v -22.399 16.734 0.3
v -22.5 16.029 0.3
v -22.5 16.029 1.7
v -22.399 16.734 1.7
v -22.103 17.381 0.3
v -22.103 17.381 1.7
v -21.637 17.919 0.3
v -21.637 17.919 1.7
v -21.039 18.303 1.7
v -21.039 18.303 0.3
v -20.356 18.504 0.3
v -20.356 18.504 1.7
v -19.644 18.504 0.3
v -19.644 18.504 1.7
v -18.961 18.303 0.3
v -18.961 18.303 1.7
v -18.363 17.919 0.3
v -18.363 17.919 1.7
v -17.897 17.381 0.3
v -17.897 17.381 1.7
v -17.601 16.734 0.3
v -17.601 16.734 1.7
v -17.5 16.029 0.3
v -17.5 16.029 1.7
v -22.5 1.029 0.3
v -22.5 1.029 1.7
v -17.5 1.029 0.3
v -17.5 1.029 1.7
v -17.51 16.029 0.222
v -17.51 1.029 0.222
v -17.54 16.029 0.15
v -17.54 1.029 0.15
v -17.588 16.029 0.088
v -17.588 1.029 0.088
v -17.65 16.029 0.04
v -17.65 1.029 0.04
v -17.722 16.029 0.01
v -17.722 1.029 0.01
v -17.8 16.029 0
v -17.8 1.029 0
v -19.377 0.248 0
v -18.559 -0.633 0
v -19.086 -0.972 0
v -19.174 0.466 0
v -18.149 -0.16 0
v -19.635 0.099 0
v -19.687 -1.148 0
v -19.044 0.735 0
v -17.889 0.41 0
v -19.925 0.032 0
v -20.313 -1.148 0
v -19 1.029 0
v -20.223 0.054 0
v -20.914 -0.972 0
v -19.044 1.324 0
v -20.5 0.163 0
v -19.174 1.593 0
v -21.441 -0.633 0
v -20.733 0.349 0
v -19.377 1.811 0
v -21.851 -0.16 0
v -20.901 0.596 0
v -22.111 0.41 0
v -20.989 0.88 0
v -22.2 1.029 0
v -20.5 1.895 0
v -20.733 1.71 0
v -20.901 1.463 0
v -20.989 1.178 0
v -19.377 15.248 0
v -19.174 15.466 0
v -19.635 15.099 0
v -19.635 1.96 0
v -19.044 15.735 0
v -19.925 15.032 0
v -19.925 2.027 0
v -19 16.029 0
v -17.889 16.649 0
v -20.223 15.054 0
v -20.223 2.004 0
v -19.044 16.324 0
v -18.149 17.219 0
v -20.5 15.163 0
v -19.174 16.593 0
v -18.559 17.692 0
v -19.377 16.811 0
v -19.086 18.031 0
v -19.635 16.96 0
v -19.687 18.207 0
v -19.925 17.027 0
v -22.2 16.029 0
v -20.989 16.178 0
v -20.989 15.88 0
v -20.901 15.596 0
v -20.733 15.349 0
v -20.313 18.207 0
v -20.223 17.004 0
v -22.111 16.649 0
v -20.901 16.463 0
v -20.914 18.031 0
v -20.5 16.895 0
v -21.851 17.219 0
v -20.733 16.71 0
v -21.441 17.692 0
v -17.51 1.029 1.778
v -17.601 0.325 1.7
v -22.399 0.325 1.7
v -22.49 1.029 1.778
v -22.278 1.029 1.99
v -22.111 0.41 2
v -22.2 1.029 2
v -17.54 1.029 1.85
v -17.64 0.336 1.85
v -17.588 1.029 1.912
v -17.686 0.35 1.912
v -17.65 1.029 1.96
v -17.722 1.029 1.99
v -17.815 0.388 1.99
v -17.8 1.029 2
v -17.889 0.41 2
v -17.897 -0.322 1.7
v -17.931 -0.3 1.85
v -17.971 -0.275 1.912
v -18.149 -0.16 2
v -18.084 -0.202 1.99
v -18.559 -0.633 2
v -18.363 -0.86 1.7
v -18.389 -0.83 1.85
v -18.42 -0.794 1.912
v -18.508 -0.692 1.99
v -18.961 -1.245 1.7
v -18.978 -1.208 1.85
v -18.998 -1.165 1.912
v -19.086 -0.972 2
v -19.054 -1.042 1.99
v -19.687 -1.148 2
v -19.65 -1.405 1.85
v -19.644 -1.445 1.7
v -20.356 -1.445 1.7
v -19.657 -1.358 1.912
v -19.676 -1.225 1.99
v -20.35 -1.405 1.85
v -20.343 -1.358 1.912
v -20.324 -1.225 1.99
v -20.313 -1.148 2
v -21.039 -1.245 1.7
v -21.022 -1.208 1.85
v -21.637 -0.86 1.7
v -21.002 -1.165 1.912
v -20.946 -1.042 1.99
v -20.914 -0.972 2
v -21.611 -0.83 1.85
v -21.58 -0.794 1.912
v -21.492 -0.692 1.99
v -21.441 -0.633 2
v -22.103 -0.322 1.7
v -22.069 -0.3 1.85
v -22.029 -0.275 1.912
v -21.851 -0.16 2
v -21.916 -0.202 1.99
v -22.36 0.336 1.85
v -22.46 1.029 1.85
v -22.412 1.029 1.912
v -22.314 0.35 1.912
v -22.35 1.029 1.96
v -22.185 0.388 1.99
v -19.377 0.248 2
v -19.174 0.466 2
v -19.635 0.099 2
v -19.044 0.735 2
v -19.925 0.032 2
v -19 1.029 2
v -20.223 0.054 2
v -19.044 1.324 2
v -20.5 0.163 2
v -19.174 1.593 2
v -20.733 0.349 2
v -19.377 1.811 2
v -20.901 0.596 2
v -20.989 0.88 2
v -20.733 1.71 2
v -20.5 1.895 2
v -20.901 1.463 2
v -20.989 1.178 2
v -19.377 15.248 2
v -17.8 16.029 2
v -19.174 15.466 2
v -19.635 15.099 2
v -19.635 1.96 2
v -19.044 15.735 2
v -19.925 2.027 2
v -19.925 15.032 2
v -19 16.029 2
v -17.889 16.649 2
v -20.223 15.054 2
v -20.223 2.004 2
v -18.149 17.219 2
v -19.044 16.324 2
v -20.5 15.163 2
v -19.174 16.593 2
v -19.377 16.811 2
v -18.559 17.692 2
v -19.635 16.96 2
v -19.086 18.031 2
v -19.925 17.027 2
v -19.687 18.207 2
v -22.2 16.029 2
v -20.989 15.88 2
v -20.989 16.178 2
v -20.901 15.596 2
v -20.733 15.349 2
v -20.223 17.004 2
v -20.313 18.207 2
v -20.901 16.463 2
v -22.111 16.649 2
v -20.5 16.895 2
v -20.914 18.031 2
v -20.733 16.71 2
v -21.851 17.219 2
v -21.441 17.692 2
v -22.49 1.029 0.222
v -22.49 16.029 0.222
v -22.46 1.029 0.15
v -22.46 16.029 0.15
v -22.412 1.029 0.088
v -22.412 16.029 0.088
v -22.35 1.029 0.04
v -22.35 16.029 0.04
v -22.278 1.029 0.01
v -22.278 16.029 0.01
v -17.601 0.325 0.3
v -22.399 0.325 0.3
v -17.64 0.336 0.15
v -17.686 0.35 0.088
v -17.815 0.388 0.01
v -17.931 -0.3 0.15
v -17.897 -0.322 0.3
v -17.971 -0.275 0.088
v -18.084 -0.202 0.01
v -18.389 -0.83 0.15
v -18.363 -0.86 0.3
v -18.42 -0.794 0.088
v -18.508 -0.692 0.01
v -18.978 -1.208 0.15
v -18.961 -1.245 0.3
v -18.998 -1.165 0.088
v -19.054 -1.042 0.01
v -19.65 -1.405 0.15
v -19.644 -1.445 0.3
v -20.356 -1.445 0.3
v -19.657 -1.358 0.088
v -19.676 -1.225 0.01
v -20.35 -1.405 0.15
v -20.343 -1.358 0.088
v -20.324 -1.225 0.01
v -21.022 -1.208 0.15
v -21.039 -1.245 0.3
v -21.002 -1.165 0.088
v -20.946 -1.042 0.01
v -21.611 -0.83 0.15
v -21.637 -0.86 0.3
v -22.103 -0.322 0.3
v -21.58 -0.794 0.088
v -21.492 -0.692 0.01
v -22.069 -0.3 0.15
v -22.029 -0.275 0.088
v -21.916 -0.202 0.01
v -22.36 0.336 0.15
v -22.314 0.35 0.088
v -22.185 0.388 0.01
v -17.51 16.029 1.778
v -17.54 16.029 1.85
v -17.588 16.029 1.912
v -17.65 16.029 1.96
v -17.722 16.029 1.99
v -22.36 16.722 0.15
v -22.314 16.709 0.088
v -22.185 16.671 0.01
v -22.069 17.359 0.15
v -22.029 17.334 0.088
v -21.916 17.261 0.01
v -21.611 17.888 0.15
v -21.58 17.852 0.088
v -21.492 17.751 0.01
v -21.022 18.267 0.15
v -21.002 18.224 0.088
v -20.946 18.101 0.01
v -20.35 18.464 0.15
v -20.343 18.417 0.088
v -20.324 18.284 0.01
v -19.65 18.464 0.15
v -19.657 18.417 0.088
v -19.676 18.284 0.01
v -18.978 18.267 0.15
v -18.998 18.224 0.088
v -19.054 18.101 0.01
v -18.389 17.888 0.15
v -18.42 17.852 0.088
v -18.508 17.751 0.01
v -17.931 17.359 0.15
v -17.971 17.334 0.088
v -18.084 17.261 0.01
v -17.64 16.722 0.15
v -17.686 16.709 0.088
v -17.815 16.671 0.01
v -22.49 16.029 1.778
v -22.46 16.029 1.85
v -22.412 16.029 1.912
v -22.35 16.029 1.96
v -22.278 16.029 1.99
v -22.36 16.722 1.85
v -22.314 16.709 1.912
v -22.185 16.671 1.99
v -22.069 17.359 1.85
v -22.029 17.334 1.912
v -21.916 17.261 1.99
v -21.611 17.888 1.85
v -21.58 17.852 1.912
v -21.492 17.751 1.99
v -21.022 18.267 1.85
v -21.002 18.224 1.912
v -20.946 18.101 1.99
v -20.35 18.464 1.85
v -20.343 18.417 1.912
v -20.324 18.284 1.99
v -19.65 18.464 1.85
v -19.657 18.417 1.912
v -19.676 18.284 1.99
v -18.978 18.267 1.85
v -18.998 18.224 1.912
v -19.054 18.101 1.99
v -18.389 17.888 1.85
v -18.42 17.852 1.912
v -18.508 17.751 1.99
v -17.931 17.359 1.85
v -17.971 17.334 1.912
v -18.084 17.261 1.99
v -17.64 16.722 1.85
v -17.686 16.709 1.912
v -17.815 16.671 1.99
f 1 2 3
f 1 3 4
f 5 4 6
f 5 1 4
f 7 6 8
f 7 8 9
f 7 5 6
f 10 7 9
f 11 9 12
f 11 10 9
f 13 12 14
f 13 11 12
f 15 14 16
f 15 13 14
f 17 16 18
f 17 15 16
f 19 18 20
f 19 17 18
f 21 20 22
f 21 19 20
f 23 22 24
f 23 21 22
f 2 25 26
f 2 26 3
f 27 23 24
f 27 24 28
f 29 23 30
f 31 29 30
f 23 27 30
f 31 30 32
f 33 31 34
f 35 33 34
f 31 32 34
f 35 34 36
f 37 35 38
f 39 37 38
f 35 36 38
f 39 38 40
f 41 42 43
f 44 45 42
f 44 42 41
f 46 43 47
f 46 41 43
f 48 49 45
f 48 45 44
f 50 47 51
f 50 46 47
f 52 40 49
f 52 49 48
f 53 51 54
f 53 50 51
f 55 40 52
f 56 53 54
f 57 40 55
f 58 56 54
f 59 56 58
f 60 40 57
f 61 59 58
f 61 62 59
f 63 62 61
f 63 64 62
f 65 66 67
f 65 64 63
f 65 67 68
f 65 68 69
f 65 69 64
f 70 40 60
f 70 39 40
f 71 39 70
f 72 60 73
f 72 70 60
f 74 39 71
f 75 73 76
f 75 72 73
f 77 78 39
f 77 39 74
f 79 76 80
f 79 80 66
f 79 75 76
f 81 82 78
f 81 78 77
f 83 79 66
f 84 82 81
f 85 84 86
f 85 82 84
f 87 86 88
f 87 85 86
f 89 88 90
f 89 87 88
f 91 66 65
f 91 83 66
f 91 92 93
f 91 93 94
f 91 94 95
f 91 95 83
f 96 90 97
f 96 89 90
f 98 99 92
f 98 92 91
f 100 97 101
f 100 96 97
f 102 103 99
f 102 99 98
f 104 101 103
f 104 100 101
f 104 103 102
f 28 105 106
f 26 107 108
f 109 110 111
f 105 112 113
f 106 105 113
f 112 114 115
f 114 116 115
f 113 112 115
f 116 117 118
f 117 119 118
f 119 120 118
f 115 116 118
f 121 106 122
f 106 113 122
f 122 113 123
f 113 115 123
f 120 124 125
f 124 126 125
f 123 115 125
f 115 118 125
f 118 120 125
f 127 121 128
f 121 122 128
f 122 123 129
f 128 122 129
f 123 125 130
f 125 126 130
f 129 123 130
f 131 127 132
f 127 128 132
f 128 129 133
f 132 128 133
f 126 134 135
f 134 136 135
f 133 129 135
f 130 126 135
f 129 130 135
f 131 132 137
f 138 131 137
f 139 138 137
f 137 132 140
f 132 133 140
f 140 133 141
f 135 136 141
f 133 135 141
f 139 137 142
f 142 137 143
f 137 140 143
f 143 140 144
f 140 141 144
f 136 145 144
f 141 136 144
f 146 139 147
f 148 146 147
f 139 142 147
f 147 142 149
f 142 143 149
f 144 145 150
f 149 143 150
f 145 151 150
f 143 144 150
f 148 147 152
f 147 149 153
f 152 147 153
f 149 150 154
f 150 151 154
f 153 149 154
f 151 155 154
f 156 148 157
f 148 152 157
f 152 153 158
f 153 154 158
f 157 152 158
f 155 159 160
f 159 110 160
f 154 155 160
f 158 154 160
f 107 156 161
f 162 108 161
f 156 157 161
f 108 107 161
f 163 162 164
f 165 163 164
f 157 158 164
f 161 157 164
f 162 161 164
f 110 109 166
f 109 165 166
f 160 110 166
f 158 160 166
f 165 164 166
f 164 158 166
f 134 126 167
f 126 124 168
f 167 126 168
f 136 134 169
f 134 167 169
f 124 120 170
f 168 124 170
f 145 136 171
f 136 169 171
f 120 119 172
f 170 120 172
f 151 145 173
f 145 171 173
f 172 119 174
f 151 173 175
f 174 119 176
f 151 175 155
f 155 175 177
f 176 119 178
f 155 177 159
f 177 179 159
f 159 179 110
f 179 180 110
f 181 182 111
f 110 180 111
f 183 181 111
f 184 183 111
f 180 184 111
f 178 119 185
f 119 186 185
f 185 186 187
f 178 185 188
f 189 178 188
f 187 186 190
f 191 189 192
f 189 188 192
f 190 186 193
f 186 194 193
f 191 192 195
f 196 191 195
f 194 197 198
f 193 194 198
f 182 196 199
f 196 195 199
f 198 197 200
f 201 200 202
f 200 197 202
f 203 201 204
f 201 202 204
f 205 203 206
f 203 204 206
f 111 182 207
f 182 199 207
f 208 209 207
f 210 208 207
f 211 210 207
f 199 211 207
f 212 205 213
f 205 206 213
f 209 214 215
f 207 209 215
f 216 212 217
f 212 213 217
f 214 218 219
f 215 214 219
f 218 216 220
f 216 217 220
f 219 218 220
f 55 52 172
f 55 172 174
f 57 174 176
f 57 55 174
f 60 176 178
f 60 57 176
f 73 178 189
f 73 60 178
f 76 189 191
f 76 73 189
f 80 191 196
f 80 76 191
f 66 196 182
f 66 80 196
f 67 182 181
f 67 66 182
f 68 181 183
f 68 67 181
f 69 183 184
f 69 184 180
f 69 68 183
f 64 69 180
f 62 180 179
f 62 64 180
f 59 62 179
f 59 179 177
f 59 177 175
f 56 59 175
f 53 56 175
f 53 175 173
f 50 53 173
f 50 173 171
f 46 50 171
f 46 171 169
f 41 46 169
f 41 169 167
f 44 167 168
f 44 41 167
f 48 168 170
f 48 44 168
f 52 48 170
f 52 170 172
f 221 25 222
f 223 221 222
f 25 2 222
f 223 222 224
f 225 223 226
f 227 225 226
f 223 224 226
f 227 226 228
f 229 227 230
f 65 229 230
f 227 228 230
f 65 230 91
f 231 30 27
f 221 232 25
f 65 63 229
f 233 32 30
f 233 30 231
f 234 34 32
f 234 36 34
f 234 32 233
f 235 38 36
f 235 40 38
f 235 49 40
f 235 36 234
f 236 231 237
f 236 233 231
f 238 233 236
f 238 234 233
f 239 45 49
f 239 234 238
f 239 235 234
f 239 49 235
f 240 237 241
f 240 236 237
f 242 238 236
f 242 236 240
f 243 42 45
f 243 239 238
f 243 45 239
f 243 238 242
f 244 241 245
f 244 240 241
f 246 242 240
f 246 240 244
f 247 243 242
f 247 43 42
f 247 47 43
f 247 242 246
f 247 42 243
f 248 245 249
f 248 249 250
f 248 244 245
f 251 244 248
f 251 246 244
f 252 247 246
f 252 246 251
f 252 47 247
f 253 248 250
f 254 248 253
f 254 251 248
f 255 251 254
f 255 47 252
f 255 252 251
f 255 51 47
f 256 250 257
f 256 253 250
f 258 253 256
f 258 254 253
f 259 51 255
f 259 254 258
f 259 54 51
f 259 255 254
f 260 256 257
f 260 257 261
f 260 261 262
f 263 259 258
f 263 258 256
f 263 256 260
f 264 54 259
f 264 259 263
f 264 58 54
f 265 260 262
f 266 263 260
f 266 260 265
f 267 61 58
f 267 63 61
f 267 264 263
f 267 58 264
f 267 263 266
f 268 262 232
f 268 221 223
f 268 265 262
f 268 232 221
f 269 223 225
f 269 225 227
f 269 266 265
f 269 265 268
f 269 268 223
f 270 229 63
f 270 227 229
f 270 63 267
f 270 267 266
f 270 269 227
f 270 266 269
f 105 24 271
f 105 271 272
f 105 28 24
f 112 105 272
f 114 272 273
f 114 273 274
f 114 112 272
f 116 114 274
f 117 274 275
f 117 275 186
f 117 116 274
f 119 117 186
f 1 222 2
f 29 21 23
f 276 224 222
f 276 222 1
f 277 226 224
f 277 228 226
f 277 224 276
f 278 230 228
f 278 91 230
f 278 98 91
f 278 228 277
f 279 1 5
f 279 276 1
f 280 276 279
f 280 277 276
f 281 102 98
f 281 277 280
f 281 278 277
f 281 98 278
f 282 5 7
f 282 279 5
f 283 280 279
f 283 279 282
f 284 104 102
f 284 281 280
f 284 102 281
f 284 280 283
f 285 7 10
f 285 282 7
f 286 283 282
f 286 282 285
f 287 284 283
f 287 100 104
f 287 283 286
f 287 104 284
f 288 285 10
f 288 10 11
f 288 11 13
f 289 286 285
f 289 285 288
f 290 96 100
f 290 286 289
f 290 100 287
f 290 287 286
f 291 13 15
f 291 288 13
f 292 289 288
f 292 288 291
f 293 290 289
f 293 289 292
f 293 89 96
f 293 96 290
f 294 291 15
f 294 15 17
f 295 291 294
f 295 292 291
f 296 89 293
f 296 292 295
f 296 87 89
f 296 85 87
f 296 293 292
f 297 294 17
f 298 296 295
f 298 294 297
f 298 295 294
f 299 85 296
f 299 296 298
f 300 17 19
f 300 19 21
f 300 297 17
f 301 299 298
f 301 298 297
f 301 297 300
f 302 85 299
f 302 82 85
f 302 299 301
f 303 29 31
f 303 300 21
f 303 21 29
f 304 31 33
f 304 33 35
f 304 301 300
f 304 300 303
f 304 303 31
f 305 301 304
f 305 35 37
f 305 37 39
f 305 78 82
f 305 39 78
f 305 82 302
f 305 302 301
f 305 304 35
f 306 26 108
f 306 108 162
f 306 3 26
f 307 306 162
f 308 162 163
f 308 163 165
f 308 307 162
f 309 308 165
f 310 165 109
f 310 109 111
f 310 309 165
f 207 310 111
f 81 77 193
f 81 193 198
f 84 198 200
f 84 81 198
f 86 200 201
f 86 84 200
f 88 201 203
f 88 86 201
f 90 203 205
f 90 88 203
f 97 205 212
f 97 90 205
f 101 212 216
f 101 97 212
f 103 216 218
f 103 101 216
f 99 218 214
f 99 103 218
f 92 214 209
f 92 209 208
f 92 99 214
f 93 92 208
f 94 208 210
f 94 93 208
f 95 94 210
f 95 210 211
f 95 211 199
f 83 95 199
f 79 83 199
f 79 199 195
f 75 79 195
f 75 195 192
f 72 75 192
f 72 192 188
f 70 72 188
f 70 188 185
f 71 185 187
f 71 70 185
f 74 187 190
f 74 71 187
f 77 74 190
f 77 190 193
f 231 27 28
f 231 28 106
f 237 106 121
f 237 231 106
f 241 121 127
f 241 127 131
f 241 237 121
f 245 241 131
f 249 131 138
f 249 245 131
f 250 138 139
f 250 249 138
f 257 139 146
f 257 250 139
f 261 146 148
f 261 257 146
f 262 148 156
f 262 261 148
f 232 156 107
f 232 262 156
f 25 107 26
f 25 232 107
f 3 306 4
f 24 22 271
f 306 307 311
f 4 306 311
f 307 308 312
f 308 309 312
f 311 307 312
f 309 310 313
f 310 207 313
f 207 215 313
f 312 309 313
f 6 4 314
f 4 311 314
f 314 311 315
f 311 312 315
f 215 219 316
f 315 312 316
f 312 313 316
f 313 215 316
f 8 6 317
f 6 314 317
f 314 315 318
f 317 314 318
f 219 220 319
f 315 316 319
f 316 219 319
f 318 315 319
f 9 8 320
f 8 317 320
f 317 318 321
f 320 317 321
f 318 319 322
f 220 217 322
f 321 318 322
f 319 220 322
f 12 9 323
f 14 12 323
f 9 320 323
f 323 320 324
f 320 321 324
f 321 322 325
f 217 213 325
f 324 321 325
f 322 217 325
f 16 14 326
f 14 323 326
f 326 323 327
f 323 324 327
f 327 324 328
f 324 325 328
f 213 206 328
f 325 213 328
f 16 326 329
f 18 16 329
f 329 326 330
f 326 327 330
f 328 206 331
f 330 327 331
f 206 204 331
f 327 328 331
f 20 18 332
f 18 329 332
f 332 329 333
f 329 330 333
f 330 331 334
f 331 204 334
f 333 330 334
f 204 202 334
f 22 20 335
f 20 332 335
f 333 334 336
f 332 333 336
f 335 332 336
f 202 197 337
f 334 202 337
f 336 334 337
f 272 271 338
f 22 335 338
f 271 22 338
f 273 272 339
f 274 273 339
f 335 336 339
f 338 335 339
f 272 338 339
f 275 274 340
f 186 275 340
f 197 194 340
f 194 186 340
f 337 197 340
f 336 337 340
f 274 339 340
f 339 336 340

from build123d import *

# Parameters (mm, degrees)
SKETCH_1_R      = 1
EXTRUDE_2_DEPTH = 2
FILLET_1_R      = 0.3


with BuildPart() as part:
    # 草图1 → 凸台-拉伸2 (new body)
    with BuildSketch(Plane.XY):
        with BuildLine():
            Line((-22.5, 1.029411765), (-22.5, 16.029411765))
            ThreePointArc((-22.5, 16.029411765), (-20, 18.529411765), (-17.5, 16.029411765))
            Line((-17.5, 16.029411765), (-17.5, 1.029411765))
            ThreePointArc((-17.5, 1.029411765), (-20, -1.470588235), (-22.5, 1.029411765))
        make_face()
        with Locations((-20, 16.029411765)):
            Circle(SKETCH_1_R, mode=Mode.SUBTRACT)
        with Locations((-20, 1.029411765)):
            Circle(SKETCH_1_R, mode=Mode.SUBTRACT)
    extrude(amount=EXTRUDE_2_DEPTH)

    # 圆角1
    fillet_1_edges = [part.edges().sort_by_distance(p)[0] for p in [
        (-20, 18.529411765, 2),
        (-22.5, 8.529411765, 2),
        (-20, -1.470588235, 2),
        (-22.5, 8.529411765, 0),
        (-20, 18.529411765, 0),
        (-17.5, 8.529411765, 0),
        (-20, -1.470588235, 0),
        (-17.5, 8.529411765, 2),
    ]]
    fillet(fillet_1_edges, radius=FILLET_1_R)


solid = part.part
